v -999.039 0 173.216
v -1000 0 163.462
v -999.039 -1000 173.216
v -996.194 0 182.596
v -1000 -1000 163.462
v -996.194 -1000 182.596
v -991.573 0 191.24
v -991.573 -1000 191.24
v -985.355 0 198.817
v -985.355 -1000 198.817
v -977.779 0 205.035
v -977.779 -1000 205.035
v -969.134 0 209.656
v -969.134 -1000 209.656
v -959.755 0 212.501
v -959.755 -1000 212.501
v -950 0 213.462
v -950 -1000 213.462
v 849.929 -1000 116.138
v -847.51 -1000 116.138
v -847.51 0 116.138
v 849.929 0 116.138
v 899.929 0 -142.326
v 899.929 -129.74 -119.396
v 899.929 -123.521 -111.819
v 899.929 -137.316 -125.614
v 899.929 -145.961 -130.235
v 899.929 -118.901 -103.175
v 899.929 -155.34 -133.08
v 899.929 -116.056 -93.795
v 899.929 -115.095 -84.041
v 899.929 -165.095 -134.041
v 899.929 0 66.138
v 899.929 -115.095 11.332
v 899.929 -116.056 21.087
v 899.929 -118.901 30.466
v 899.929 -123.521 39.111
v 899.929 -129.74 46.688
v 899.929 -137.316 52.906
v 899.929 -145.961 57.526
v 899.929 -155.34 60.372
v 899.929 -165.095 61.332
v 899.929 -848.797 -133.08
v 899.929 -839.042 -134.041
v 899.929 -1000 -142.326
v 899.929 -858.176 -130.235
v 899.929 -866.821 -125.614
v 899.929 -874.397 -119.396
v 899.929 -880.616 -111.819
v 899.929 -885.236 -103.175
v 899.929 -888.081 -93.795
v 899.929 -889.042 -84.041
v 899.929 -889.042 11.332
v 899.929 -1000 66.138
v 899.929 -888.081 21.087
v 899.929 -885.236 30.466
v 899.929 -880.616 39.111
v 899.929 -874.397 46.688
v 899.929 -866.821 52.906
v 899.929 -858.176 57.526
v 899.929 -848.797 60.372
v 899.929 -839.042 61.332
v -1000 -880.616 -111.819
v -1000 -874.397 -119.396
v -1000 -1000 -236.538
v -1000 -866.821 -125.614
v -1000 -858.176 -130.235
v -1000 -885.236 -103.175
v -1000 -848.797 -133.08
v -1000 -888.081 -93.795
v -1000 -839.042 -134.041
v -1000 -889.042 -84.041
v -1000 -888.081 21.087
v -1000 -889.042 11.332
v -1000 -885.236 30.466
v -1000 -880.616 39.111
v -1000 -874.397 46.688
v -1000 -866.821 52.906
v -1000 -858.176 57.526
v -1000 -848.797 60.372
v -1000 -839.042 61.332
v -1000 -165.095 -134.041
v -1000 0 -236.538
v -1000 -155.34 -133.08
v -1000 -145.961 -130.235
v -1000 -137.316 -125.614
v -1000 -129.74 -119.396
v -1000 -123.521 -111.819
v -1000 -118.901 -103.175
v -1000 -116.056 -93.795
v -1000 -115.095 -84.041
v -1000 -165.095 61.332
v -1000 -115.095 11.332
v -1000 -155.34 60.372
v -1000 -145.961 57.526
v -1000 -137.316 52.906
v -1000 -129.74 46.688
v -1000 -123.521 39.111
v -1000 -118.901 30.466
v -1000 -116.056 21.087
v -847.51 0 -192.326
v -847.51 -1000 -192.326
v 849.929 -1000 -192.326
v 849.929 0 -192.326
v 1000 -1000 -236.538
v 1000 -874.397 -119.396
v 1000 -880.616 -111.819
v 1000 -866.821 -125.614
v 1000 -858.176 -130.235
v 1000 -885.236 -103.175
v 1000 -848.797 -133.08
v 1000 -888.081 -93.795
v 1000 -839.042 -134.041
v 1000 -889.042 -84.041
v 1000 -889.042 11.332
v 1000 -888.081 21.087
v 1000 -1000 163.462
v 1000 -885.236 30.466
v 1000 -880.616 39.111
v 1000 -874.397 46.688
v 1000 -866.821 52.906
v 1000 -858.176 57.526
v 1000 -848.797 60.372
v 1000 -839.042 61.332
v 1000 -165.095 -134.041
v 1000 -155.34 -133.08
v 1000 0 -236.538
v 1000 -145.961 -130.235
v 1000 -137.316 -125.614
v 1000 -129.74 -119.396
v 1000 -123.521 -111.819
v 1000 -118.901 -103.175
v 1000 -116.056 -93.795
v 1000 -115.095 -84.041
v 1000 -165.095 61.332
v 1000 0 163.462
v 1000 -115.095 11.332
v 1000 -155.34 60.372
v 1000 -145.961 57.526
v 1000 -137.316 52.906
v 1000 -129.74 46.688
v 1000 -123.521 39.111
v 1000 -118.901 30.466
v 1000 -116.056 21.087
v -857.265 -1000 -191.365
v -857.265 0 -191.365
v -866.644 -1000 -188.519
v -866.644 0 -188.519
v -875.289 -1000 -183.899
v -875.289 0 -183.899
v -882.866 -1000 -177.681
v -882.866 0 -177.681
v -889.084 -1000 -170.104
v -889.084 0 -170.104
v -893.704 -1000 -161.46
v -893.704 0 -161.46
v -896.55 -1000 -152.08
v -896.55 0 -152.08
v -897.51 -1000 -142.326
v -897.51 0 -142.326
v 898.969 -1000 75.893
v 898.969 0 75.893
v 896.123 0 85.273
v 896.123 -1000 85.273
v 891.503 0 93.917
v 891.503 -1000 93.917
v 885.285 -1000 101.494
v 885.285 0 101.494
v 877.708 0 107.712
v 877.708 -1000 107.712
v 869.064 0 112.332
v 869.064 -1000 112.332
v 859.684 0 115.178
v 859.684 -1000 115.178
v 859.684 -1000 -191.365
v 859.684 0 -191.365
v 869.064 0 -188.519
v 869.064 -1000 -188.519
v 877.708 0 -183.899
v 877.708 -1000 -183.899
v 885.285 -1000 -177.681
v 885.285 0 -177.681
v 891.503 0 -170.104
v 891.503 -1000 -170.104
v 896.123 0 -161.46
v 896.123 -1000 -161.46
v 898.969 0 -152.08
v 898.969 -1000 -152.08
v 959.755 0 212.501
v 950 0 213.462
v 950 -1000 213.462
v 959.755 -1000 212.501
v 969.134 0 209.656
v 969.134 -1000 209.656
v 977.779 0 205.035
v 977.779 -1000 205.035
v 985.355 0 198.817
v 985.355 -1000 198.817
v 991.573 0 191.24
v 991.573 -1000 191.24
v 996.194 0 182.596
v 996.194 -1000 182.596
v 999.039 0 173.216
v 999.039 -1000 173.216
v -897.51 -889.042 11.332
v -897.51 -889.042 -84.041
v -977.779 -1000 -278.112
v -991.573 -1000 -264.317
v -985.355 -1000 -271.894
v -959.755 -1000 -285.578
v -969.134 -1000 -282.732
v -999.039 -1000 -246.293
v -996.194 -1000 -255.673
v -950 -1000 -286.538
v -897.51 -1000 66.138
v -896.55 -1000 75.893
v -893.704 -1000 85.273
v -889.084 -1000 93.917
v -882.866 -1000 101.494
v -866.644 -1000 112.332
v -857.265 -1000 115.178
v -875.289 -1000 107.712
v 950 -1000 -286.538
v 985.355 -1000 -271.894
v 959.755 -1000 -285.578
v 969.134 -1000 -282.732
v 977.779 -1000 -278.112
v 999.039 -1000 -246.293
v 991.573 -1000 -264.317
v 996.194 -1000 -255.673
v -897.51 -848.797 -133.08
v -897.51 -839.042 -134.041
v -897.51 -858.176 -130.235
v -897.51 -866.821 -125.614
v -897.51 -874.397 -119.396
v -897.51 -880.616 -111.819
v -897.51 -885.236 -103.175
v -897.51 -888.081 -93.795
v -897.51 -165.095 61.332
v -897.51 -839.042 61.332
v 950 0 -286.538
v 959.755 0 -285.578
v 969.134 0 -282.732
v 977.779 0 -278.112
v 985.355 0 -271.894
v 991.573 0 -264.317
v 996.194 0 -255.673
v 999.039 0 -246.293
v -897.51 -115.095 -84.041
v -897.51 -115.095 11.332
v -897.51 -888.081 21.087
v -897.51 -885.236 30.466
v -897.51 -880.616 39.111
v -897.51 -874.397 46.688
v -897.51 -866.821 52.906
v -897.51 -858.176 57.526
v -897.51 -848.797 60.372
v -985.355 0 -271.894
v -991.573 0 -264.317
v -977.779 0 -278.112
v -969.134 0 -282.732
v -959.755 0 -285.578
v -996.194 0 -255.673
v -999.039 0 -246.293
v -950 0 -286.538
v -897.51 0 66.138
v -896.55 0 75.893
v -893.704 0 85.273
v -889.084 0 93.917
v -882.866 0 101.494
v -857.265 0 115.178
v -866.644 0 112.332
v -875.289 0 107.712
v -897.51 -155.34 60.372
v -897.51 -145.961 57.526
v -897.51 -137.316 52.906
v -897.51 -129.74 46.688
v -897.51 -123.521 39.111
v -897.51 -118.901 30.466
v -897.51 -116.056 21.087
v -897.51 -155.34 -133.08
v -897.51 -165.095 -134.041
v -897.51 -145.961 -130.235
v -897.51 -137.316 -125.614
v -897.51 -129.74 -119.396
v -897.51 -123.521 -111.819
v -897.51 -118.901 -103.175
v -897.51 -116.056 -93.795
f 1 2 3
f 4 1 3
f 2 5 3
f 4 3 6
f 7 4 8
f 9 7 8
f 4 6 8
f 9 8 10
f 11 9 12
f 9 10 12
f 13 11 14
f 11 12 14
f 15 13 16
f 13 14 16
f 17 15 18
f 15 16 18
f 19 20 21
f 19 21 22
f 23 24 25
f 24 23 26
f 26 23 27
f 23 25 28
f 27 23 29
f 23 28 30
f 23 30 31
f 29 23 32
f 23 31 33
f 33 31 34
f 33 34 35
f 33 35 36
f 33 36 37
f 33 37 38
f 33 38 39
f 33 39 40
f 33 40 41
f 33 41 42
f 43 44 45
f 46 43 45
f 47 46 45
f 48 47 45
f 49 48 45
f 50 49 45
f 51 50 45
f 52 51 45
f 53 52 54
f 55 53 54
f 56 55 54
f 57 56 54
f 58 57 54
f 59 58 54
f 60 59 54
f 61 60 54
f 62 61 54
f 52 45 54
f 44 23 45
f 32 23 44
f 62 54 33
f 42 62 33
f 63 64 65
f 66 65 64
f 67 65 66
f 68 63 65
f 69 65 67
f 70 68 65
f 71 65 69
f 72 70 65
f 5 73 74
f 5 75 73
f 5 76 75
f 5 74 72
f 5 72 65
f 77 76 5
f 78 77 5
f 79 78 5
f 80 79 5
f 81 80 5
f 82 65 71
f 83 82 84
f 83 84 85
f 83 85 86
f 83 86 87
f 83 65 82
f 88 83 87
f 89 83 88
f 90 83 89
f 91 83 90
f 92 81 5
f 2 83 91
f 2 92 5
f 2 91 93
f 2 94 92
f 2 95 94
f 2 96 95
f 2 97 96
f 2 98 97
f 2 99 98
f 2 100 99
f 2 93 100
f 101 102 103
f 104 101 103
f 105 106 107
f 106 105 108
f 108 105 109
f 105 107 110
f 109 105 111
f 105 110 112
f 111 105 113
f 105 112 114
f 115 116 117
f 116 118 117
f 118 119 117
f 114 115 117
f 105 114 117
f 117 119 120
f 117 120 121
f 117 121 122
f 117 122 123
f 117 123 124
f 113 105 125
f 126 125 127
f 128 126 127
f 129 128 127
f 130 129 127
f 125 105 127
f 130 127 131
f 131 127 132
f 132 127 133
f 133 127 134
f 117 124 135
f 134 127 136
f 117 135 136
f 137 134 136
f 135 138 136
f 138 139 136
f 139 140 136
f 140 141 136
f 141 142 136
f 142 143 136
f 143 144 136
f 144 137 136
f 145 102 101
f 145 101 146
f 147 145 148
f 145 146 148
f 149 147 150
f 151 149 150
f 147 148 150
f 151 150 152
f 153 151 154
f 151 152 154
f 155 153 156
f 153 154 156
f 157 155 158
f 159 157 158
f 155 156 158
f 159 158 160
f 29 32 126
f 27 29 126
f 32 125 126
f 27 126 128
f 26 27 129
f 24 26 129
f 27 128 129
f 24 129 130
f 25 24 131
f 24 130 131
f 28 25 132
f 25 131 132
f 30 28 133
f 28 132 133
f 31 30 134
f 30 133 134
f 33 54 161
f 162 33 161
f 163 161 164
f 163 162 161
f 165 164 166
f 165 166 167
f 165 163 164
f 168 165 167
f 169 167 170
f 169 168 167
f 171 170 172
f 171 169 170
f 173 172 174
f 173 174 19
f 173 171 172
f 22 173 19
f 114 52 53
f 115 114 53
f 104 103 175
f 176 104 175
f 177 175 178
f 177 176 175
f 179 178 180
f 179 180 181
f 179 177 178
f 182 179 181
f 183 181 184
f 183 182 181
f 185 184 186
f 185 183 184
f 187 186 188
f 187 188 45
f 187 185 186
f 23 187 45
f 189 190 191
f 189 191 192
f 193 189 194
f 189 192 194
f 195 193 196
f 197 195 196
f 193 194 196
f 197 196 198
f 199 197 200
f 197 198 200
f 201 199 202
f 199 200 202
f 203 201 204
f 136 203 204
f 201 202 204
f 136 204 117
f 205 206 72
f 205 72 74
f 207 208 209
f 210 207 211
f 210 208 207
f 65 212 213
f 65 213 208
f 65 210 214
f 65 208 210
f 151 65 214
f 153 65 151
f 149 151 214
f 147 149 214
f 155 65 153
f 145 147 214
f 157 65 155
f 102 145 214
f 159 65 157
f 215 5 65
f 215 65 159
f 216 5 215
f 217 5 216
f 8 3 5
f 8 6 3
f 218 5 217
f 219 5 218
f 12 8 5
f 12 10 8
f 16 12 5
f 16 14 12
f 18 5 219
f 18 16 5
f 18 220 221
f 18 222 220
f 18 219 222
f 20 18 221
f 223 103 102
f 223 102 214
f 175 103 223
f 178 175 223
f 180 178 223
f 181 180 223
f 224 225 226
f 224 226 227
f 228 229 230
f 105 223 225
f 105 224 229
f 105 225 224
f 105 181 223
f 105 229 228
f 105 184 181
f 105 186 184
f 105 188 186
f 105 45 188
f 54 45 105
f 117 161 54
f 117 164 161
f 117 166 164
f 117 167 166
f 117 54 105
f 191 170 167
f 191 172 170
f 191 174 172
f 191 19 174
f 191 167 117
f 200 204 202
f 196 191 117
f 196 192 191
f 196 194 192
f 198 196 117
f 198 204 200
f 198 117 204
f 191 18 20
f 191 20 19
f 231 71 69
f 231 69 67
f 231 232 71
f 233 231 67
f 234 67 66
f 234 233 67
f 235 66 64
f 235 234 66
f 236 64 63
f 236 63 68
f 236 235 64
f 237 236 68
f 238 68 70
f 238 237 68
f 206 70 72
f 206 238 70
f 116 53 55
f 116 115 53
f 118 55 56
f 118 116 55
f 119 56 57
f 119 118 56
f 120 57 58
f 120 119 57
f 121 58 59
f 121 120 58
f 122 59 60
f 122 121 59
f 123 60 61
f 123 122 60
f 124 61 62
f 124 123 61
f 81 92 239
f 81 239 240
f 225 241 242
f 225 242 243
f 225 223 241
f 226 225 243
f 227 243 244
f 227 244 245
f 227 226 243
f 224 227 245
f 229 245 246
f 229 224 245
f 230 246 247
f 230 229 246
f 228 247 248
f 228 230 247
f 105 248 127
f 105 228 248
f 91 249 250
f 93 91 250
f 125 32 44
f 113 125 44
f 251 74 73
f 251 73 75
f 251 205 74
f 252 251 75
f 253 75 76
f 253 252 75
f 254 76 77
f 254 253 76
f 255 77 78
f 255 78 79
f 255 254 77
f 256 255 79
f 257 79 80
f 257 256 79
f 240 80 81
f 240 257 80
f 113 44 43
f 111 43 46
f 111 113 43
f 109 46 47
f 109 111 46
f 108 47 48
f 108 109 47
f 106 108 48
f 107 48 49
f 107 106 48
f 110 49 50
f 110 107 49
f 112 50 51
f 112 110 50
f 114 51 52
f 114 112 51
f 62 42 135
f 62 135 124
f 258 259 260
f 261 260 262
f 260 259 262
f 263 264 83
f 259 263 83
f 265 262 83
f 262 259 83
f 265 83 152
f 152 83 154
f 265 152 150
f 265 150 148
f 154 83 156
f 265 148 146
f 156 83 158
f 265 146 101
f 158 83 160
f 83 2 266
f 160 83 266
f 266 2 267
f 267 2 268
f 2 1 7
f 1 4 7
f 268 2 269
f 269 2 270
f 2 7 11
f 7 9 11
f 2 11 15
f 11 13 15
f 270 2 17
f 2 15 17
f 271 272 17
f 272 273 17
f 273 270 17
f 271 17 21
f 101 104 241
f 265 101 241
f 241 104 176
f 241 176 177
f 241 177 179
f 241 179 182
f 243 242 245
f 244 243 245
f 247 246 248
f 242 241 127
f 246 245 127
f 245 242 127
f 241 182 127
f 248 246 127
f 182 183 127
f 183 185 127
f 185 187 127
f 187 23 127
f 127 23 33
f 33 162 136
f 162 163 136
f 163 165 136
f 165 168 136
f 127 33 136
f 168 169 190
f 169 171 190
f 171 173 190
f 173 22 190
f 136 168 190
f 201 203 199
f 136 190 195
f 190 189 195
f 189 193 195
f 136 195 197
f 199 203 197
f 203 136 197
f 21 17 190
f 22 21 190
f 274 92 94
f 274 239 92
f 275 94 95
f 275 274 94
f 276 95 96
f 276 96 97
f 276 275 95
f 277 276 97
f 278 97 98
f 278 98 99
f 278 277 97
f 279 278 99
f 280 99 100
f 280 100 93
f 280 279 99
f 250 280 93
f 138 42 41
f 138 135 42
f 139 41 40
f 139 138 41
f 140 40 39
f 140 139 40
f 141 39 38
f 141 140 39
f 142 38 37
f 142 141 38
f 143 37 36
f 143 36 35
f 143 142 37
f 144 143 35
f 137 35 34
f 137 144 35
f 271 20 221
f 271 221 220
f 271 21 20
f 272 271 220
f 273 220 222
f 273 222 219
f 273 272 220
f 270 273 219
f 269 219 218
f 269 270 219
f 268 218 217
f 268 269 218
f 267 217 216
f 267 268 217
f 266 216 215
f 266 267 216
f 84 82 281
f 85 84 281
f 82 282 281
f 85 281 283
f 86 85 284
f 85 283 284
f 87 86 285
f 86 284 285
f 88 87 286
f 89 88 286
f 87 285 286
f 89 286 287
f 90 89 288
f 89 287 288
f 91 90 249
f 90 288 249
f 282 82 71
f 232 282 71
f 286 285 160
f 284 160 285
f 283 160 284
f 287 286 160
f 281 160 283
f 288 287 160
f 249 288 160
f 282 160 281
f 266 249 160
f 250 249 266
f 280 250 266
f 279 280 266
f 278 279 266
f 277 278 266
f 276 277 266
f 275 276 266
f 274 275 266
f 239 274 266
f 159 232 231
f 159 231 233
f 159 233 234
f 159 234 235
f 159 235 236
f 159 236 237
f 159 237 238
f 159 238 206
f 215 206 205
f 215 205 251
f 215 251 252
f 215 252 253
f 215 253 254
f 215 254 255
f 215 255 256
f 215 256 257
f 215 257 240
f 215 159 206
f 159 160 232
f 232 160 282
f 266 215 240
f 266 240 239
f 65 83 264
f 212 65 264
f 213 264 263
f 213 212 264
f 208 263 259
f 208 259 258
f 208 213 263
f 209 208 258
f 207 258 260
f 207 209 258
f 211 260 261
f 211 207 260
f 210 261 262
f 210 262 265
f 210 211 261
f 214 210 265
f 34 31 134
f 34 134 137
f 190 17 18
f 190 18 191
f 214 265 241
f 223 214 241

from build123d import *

# Parameters (mm, degrees)
F0_W     = 2000
F0_H     = 500
F1_DEPTH = 1000
F2_W     = 1797.439754
F2_H     = 308.463849
F3_DEPTH = 1000.001
F4_R     = 50
F5_W     = 773.947201
F5_H     = 195.373047
F6_DEPTH = 2000.001
F7_R     = 50


with BuildPart() as f1:
    # F0 (on Front) → F1 (new body)
    with BuildSketch(Plane.XZ):
        with Locations((0, -36.538462)):
            Rectangle(F0_W, F0_H)
    extrude(amount=F1_DEPTH)

    # F2 (on face) → F3 (cut, through all)
    with BuildSketch(Plane.XZ.offset(1000)):
        with Locations((1.209587, -38.093578)):
            Rectangle(F2_W, F2_H)
    extrude(amount=-F3_DEPTH, mode=Mode.SUBTRACT)

    # F4
    f4_edges = [f1.edges().sort_by_distance(p)[0] for p in [
        (1000, -500, 213.461538),
        (1000, -500, -286.538462),
        (-1000, -500, 213.461538),
        (-1000, -500, -286.538462),
        (-897.51029, -500, 116.138346),
        (-897.51029, -500, -192.325503),
        (899.929464, -500, 116.138346),
        (899.929464, -500, -192.325503),
    ]]
    fillet(f4_edges, radius=F4_R)

    # F5 (on face) → F6 (cut, through all)
    with BuildSketch(Plane(origin=(-1000, 0, 0), x_dir=(0, -1, 0), z_dir=(-1, 0, 0))):
        with Locations((502.068478, -36.354279)):
            Rectangle(F5_W, F5_H)
    extrude(amount=-F6_DEPTH, mode=Mode.SUBTRACT)

    # F7
    f7_edges = [f1.edges().sort_by_distance(p)[0] for p in [
        (949.964732, -115.094878, 61.332244),
        (-948.755145, -115.094878, 61.332244),
        (949.964732, -889.042079, 61.332244),
        (-948.755145, -889.042079, 61.332244),
        (949.964732, -115.094878, -134.040803),
        (-948.755145, -115.094878, -134.040803),
        (949.964732, -889.042079, -134.040803),
        (-948.755145, -889.042079, -134.040803),
    ]]
    fillet(f7_edges, radius=F7_R)


solid = f1.part
